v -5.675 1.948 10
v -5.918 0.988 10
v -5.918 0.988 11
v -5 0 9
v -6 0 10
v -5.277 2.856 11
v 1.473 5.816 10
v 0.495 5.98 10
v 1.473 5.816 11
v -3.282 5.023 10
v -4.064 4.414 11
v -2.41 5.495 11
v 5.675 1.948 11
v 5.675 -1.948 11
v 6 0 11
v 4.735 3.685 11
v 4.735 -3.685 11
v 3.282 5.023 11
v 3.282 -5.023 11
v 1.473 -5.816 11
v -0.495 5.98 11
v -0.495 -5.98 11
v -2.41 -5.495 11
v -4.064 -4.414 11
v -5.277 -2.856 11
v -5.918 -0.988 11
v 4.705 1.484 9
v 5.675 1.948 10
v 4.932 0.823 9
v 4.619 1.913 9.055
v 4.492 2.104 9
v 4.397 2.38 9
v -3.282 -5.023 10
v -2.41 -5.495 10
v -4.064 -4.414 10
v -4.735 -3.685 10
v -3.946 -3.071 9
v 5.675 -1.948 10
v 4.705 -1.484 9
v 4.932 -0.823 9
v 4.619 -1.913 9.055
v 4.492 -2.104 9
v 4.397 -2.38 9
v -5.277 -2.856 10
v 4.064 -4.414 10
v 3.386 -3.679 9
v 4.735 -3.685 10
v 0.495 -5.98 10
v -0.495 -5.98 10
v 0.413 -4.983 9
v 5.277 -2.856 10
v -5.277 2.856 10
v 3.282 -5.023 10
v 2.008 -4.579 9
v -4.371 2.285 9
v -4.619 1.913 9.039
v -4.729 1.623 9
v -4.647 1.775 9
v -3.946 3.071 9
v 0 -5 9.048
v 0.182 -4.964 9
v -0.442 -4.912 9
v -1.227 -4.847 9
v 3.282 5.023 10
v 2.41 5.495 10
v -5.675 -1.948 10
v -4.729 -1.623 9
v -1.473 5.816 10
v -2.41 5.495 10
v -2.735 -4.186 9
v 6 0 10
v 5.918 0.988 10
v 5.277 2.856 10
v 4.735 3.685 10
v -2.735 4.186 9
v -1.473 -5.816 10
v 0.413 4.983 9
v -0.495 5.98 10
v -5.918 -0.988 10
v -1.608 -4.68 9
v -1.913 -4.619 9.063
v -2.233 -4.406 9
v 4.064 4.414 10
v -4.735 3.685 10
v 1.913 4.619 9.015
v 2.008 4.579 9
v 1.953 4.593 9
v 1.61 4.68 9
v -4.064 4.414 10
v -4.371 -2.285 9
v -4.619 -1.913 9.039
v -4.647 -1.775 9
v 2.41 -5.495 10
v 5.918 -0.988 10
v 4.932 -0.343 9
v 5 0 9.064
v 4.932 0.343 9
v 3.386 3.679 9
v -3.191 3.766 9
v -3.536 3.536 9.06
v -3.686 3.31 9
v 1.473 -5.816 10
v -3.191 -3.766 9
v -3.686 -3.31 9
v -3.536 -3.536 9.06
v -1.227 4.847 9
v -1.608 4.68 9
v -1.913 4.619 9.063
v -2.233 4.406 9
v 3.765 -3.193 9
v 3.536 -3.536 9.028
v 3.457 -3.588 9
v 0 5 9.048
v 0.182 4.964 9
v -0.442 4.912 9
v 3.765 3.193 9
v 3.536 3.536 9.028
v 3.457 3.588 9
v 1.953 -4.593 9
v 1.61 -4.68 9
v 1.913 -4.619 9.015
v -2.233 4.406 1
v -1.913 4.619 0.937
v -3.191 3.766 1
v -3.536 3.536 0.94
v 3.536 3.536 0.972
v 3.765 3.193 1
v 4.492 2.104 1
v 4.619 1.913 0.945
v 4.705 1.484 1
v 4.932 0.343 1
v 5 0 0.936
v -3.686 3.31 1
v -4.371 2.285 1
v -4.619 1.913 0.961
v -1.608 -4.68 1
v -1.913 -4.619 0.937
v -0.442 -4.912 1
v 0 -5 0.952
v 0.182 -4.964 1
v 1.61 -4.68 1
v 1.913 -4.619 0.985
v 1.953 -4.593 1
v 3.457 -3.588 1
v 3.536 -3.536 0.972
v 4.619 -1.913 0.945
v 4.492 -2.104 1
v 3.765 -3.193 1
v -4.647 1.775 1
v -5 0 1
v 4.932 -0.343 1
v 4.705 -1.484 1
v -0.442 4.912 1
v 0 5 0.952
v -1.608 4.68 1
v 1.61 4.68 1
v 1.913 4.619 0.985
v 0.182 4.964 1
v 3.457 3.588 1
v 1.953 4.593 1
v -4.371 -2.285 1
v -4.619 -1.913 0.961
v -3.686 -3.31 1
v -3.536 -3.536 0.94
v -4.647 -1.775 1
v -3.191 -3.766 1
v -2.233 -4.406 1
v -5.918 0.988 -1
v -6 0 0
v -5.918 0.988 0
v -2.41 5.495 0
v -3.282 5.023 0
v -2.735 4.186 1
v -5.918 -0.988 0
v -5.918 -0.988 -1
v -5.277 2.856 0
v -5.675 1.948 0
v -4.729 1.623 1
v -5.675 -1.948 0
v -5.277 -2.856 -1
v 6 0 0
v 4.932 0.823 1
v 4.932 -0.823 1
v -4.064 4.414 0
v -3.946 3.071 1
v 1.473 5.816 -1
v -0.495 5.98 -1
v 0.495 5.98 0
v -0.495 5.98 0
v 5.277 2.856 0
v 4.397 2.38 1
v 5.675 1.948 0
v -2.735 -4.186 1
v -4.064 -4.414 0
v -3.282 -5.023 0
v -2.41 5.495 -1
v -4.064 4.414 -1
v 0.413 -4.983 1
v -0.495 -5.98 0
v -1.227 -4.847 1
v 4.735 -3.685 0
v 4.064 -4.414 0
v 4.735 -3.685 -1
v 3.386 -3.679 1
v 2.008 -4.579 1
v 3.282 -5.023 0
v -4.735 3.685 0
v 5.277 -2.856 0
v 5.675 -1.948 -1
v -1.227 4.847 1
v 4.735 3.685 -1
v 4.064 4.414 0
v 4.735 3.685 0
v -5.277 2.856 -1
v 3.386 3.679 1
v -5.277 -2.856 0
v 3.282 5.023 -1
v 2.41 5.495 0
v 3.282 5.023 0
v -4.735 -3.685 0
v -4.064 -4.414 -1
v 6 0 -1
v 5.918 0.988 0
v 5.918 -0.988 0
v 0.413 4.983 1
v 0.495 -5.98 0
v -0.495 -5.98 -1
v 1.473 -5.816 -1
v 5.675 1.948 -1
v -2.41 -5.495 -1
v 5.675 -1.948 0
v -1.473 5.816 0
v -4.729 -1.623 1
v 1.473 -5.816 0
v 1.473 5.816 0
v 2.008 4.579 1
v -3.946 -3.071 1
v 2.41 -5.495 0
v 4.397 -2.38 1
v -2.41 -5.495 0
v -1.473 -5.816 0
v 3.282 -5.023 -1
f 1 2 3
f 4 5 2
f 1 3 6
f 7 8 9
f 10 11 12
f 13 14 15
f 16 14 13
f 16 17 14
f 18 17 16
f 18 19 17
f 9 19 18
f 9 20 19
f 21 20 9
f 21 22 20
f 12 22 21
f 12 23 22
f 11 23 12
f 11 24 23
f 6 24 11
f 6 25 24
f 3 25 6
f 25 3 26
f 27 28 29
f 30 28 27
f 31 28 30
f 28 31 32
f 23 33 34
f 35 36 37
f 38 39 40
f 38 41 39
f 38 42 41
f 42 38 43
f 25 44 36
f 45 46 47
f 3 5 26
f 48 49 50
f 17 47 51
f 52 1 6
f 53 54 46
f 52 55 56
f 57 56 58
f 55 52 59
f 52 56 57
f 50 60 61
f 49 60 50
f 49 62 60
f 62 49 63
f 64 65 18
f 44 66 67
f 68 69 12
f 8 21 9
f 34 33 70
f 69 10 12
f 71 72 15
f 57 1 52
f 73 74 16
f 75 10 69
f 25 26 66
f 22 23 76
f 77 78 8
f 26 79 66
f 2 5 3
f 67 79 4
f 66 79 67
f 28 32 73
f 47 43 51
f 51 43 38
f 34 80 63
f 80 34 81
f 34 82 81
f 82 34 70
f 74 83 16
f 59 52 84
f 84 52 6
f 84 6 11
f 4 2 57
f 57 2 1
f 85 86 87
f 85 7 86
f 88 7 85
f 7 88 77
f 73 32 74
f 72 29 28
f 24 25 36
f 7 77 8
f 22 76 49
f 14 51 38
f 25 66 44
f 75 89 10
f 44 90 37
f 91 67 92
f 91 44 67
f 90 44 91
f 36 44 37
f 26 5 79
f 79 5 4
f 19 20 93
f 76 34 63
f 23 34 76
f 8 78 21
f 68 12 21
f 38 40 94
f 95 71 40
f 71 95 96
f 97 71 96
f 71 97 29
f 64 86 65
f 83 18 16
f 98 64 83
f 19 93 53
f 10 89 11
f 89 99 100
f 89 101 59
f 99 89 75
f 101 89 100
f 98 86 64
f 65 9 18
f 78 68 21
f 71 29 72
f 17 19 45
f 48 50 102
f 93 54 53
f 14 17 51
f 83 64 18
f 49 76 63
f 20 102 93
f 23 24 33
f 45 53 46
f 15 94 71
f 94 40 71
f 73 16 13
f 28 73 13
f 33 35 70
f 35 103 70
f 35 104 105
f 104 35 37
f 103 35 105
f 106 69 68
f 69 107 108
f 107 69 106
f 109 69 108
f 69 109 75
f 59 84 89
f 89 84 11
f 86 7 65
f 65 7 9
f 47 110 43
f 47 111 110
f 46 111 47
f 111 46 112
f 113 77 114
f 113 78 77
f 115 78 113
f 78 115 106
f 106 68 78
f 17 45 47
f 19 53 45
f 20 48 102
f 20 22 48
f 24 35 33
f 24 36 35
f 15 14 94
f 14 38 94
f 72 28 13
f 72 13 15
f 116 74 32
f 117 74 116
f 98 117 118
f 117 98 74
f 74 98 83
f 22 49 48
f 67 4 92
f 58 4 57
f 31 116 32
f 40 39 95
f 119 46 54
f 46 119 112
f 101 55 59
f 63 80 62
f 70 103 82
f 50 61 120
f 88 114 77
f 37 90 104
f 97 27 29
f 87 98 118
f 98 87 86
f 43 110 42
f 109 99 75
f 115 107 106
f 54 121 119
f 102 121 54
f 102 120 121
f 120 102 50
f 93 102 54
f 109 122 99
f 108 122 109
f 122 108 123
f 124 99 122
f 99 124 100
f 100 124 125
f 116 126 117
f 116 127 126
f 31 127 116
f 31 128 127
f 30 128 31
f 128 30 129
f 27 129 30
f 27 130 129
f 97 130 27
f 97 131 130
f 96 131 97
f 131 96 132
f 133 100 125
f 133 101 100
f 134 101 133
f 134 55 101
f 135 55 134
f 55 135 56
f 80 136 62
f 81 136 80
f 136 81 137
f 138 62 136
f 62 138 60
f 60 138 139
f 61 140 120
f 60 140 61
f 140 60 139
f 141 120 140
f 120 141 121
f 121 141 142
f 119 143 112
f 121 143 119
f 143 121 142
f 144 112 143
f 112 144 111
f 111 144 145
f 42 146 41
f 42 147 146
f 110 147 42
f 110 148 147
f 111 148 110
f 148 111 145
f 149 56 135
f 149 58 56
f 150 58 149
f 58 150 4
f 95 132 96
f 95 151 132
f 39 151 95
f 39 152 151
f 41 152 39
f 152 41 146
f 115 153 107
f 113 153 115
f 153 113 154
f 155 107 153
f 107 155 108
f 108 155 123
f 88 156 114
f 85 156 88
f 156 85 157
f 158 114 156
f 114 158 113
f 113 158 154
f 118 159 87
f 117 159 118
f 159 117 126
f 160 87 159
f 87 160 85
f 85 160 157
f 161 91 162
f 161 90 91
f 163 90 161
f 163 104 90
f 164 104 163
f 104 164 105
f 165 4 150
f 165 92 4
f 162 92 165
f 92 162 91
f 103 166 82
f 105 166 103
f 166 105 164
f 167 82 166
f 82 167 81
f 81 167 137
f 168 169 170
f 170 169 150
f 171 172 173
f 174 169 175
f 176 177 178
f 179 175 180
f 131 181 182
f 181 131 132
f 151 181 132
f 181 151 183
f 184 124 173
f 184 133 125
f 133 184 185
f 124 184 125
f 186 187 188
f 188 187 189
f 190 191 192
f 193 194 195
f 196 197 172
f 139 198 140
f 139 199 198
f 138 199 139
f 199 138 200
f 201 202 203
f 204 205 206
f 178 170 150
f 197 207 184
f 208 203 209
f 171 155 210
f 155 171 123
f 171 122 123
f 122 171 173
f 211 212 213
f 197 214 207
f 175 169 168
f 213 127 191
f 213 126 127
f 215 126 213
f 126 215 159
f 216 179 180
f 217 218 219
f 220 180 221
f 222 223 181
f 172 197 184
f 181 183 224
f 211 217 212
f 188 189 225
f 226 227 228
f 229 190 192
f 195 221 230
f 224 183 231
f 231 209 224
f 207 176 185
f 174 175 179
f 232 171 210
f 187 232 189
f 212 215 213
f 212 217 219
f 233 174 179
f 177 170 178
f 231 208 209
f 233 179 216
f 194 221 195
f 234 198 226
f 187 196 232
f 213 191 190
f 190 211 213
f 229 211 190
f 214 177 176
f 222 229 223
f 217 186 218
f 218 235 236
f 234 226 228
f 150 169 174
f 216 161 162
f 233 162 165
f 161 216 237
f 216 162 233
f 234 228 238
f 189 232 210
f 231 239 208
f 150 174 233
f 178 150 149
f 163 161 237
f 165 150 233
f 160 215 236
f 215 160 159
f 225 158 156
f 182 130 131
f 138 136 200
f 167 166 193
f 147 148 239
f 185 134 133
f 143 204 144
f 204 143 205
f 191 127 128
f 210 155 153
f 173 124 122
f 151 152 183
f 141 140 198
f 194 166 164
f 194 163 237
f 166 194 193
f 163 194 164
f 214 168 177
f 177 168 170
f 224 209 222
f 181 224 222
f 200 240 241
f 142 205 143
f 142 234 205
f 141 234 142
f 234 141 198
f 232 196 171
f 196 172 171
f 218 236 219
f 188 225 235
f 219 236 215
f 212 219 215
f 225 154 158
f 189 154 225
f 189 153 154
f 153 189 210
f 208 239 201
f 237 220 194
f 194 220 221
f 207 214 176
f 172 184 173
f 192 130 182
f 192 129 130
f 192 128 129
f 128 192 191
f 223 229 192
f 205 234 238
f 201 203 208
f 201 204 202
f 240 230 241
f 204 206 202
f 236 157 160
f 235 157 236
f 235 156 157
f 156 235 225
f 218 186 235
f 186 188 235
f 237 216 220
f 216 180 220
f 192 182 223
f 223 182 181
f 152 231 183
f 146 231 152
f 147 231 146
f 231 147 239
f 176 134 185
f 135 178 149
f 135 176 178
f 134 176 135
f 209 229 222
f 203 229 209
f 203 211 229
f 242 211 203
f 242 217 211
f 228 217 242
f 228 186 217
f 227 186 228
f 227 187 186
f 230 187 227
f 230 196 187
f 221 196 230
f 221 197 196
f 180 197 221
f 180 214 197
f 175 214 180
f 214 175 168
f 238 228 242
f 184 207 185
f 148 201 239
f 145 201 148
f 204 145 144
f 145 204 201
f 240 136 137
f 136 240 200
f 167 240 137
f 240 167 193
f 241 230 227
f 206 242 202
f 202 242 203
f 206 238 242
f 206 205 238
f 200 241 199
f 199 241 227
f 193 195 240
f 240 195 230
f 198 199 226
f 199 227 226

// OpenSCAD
// file: torus.scad
torus();

module torus(
    h = 2,     
    r = 10,   
    sides = $fn)
{
    tube_radius = h / 2;
    inside_radius = r - tube_radius;
    //translate([r,r,thickness_radius])
    translate([0,0,tube_radius])
    rotate_extrude()
    translate([inside_radius, 0, 0])
    circle(r = tube_radius, $fn = sides);
}
// main file
use <torus.scad>;

inverted_chamfer_cylinder();

module inverted_chamfer_cylinder(
    h = 10, 
    r = 5, 
    chamfer_radius = 1,
    extra_margin_bottom = 1,
    extra_margin_top = 1)
{    
    chamfer_diameter = chamfer_radius * 2;
    
    union()
    {
        translate([0, 0, h-chamfer_radius])
        hull()
        {            
            inverted_chamfer_rim_top();    
            
            translate([0,0,chamfer_radius])
            cylinder(
                h = extra_margin_top,
                r = r + chamfer_radius);
        }
        
        cylinder(h=h, r=r);
        
        hull()
        {            
            inverted_chamfer_rim_bottom();
            translate([0,0,-extra_margin_bottom])
            cylinder(
                h = extra_margin_bottom,
                r = r + chamfer_radius);
        }
    }
    
    module inverted_chamfer_rim_top()
    {
        difference()
        {
            inverted_chamfer_torus();
            
            translate([0,0,chamfer_radius])
            cylinder(
                h = chamfer_radius,
                r = r + chamfer_radius);
        }
    }
    
    module inverted_chamfer_rim_bottom()
    {
        translate([0,0,-chamfer_radius])
        difference()
        {
            inverted_chamfer_torus();
            
            cylinder(
                h = chamfer_radius,
                r = r + chamfer_radius);
        }
    }
    
    module inverted_chamfer_torus()
    {
        torus(h = chamfer_diameter, r = r + chamfer_radius, sides = 4);
    }
}
